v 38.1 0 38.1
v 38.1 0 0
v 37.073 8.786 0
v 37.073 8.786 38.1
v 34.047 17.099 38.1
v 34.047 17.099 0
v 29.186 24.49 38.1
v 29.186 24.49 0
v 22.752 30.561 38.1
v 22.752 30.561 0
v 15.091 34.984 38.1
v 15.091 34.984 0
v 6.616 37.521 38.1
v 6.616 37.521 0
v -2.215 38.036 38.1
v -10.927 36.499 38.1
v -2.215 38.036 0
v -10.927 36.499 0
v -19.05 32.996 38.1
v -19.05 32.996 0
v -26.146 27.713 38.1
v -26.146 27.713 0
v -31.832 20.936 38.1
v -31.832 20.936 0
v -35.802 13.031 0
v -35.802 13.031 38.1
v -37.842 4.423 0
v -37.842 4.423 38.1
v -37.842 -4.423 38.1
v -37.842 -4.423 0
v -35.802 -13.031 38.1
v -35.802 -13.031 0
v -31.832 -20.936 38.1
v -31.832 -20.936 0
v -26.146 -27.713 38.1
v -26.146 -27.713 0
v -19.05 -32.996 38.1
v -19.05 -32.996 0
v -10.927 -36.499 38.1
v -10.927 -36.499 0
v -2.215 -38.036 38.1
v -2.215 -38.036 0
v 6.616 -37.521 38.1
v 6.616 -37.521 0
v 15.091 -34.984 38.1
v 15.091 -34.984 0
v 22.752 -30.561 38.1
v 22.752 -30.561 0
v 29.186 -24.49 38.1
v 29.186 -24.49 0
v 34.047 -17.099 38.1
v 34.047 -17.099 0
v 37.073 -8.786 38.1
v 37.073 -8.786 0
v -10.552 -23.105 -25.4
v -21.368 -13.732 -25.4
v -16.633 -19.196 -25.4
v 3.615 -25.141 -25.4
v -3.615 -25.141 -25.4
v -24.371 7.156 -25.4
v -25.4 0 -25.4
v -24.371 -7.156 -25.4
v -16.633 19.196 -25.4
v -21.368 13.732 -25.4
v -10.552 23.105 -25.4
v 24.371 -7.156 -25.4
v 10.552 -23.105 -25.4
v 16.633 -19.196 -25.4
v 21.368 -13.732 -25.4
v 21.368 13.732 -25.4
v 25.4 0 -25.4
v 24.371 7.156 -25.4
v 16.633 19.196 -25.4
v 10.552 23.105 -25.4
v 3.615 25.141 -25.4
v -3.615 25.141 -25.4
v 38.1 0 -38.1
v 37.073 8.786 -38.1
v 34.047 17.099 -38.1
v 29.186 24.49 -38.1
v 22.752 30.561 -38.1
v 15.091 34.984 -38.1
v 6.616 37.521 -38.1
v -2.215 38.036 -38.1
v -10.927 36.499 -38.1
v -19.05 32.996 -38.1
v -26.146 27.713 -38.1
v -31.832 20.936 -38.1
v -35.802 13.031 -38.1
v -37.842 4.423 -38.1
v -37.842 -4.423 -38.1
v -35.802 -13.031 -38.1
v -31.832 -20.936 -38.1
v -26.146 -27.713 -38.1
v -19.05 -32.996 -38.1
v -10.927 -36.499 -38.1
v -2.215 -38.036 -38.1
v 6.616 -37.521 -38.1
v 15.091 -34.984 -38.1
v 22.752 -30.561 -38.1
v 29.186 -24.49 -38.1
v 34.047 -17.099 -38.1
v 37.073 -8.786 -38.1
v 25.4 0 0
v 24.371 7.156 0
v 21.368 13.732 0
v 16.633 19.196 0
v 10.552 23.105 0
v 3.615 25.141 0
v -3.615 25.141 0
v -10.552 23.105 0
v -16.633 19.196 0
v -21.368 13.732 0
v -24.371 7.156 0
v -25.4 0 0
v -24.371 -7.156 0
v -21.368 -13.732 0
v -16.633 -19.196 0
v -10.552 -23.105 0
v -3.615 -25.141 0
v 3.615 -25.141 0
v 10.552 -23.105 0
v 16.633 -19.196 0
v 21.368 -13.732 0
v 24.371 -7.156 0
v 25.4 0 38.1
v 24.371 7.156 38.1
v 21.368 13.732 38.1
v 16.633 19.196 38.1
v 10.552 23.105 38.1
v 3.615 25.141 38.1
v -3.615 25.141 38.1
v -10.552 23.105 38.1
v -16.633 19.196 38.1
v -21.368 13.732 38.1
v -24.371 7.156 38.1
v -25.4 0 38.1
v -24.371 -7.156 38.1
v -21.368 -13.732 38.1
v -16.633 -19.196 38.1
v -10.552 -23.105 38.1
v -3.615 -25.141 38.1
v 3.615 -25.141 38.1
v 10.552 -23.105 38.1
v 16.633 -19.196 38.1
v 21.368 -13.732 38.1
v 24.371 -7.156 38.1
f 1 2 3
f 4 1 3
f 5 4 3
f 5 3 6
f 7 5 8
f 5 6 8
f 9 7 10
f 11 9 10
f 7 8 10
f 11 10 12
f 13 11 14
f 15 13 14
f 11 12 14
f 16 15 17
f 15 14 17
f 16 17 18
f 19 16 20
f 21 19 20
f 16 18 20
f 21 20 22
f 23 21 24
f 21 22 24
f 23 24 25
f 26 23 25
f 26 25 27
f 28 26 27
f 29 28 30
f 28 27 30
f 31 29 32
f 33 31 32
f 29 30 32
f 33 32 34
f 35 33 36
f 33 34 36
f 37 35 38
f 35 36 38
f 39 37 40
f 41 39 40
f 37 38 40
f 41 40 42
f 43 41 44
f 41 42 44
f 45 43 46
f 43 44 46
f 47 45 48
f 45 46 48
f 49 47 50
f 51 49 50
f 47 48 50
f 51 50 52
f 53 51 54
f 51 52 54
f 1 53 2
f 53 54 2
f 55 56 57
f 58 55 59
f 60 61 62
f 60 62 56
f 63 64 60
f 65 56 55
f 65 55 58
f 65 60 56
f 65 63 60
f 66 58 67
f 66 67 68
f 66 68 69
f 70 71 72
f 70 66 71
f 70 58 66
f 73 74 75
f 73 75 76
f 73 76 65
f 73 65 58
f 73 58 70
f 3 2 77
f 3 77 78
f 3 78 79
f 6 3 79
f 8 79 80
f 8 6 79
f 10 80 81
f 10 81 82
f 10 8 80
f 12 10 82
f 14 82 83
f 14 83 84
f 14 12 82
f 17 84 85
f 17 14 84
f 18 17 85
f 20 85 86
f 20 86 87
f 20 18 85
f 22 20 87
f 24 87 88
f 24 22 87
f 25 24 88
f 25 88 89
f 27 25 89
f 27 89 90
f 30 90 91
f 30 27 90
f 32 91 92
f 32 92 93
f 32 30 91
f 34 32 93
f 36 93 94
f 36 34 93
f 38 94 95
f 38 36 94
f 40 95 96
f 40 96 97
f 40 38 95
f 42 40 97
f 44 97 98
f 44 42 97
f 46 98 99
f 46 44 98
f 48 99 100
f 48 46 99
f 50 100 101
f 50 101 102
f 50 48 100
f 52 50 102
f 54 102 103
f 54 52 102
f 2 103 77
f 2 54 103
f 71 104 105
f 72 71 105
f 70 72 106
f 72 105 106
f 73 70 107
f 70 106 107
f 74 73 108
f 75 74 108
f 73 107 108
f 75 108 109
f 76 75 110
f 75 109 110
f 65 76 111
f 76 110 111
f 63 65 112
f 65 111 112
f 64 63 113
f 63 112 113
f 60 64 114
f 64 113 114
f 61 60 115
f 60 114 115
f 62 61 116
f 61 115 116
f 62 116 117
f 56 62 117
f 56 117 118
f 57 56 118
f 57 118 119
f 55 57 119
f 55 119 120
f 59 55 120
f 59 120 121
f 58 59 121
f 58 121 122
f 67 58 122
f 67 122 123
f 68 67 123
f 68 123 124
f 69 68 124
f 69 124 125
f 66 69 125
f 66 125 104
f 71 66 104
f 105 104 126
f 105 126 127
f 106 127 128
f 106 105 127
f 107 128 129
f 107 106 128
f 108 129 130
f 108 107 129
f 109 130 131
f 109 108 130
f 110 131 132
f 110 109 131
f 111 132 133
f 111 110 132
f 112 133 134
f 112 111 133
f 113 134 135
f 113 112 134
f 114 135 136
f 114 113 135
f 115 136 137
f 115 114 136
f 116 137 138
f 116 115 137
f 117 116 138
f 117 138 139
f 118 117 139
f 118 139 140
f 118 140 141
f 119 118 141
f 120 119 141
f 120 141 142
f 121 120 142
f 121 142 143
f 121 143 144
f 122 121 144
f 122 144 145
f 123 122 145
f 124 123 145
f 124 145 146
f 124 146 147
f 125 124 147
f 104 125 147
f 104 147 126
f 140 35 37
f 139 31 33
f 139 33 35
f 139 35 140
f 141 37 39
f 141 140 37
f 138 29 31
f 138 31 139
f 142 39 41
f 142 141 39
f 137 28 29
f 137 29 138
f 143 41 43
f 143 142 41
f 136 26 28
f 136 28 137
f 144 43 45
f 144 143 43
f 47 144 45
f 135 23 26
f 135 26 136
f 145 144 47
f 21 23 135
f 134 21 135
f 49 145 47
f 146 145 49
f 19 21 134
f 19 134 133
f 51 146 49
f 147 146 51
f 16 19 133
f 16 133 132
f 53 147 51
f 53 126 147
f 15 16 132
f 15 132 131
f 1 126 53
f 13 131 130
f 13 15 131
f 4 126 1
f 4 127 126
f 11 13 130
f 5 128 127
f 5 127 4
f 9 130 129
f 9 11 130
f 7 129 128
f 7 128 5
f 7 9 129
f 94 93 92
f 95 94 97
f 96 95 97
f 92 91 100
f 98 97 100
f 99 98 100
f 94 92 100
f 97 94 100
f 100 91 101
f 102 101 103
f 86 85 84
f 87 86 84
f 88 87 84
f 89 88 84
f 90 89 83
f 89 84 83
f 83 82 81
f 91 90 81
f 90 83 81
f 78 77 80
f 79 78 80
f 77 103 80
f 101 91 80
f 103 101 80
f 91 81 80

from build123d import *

# Parameters (mm, degrees)
F0_R      = 38.1
F1_DEPTH  = 38.1
F1_FACE_R = 38.1
F2_DEPTH  = 38.1
F3_T      = -12.7


with BuildPart() as f1:
    # F0 (on Top) → F1 (new body)
    with BuildSketch(Plane.XY):
        Circle(F0_R)
    extrude(amount=-F1_DEPTH)

    # F1_face (on face) → F2 (join)
    with BuildSketch(Plane.XY):
        Circle(F1_FACE_R)
    extrude(amount=F2_DEPTH)

    # F3
    f3_openings = [f1.faces().sort_by_distance(p)[0] for p in [
        (0, 0, 38.1),
    ]]
    offset(amount=F3_T, openings=f3_openings)


solid = f1.part
